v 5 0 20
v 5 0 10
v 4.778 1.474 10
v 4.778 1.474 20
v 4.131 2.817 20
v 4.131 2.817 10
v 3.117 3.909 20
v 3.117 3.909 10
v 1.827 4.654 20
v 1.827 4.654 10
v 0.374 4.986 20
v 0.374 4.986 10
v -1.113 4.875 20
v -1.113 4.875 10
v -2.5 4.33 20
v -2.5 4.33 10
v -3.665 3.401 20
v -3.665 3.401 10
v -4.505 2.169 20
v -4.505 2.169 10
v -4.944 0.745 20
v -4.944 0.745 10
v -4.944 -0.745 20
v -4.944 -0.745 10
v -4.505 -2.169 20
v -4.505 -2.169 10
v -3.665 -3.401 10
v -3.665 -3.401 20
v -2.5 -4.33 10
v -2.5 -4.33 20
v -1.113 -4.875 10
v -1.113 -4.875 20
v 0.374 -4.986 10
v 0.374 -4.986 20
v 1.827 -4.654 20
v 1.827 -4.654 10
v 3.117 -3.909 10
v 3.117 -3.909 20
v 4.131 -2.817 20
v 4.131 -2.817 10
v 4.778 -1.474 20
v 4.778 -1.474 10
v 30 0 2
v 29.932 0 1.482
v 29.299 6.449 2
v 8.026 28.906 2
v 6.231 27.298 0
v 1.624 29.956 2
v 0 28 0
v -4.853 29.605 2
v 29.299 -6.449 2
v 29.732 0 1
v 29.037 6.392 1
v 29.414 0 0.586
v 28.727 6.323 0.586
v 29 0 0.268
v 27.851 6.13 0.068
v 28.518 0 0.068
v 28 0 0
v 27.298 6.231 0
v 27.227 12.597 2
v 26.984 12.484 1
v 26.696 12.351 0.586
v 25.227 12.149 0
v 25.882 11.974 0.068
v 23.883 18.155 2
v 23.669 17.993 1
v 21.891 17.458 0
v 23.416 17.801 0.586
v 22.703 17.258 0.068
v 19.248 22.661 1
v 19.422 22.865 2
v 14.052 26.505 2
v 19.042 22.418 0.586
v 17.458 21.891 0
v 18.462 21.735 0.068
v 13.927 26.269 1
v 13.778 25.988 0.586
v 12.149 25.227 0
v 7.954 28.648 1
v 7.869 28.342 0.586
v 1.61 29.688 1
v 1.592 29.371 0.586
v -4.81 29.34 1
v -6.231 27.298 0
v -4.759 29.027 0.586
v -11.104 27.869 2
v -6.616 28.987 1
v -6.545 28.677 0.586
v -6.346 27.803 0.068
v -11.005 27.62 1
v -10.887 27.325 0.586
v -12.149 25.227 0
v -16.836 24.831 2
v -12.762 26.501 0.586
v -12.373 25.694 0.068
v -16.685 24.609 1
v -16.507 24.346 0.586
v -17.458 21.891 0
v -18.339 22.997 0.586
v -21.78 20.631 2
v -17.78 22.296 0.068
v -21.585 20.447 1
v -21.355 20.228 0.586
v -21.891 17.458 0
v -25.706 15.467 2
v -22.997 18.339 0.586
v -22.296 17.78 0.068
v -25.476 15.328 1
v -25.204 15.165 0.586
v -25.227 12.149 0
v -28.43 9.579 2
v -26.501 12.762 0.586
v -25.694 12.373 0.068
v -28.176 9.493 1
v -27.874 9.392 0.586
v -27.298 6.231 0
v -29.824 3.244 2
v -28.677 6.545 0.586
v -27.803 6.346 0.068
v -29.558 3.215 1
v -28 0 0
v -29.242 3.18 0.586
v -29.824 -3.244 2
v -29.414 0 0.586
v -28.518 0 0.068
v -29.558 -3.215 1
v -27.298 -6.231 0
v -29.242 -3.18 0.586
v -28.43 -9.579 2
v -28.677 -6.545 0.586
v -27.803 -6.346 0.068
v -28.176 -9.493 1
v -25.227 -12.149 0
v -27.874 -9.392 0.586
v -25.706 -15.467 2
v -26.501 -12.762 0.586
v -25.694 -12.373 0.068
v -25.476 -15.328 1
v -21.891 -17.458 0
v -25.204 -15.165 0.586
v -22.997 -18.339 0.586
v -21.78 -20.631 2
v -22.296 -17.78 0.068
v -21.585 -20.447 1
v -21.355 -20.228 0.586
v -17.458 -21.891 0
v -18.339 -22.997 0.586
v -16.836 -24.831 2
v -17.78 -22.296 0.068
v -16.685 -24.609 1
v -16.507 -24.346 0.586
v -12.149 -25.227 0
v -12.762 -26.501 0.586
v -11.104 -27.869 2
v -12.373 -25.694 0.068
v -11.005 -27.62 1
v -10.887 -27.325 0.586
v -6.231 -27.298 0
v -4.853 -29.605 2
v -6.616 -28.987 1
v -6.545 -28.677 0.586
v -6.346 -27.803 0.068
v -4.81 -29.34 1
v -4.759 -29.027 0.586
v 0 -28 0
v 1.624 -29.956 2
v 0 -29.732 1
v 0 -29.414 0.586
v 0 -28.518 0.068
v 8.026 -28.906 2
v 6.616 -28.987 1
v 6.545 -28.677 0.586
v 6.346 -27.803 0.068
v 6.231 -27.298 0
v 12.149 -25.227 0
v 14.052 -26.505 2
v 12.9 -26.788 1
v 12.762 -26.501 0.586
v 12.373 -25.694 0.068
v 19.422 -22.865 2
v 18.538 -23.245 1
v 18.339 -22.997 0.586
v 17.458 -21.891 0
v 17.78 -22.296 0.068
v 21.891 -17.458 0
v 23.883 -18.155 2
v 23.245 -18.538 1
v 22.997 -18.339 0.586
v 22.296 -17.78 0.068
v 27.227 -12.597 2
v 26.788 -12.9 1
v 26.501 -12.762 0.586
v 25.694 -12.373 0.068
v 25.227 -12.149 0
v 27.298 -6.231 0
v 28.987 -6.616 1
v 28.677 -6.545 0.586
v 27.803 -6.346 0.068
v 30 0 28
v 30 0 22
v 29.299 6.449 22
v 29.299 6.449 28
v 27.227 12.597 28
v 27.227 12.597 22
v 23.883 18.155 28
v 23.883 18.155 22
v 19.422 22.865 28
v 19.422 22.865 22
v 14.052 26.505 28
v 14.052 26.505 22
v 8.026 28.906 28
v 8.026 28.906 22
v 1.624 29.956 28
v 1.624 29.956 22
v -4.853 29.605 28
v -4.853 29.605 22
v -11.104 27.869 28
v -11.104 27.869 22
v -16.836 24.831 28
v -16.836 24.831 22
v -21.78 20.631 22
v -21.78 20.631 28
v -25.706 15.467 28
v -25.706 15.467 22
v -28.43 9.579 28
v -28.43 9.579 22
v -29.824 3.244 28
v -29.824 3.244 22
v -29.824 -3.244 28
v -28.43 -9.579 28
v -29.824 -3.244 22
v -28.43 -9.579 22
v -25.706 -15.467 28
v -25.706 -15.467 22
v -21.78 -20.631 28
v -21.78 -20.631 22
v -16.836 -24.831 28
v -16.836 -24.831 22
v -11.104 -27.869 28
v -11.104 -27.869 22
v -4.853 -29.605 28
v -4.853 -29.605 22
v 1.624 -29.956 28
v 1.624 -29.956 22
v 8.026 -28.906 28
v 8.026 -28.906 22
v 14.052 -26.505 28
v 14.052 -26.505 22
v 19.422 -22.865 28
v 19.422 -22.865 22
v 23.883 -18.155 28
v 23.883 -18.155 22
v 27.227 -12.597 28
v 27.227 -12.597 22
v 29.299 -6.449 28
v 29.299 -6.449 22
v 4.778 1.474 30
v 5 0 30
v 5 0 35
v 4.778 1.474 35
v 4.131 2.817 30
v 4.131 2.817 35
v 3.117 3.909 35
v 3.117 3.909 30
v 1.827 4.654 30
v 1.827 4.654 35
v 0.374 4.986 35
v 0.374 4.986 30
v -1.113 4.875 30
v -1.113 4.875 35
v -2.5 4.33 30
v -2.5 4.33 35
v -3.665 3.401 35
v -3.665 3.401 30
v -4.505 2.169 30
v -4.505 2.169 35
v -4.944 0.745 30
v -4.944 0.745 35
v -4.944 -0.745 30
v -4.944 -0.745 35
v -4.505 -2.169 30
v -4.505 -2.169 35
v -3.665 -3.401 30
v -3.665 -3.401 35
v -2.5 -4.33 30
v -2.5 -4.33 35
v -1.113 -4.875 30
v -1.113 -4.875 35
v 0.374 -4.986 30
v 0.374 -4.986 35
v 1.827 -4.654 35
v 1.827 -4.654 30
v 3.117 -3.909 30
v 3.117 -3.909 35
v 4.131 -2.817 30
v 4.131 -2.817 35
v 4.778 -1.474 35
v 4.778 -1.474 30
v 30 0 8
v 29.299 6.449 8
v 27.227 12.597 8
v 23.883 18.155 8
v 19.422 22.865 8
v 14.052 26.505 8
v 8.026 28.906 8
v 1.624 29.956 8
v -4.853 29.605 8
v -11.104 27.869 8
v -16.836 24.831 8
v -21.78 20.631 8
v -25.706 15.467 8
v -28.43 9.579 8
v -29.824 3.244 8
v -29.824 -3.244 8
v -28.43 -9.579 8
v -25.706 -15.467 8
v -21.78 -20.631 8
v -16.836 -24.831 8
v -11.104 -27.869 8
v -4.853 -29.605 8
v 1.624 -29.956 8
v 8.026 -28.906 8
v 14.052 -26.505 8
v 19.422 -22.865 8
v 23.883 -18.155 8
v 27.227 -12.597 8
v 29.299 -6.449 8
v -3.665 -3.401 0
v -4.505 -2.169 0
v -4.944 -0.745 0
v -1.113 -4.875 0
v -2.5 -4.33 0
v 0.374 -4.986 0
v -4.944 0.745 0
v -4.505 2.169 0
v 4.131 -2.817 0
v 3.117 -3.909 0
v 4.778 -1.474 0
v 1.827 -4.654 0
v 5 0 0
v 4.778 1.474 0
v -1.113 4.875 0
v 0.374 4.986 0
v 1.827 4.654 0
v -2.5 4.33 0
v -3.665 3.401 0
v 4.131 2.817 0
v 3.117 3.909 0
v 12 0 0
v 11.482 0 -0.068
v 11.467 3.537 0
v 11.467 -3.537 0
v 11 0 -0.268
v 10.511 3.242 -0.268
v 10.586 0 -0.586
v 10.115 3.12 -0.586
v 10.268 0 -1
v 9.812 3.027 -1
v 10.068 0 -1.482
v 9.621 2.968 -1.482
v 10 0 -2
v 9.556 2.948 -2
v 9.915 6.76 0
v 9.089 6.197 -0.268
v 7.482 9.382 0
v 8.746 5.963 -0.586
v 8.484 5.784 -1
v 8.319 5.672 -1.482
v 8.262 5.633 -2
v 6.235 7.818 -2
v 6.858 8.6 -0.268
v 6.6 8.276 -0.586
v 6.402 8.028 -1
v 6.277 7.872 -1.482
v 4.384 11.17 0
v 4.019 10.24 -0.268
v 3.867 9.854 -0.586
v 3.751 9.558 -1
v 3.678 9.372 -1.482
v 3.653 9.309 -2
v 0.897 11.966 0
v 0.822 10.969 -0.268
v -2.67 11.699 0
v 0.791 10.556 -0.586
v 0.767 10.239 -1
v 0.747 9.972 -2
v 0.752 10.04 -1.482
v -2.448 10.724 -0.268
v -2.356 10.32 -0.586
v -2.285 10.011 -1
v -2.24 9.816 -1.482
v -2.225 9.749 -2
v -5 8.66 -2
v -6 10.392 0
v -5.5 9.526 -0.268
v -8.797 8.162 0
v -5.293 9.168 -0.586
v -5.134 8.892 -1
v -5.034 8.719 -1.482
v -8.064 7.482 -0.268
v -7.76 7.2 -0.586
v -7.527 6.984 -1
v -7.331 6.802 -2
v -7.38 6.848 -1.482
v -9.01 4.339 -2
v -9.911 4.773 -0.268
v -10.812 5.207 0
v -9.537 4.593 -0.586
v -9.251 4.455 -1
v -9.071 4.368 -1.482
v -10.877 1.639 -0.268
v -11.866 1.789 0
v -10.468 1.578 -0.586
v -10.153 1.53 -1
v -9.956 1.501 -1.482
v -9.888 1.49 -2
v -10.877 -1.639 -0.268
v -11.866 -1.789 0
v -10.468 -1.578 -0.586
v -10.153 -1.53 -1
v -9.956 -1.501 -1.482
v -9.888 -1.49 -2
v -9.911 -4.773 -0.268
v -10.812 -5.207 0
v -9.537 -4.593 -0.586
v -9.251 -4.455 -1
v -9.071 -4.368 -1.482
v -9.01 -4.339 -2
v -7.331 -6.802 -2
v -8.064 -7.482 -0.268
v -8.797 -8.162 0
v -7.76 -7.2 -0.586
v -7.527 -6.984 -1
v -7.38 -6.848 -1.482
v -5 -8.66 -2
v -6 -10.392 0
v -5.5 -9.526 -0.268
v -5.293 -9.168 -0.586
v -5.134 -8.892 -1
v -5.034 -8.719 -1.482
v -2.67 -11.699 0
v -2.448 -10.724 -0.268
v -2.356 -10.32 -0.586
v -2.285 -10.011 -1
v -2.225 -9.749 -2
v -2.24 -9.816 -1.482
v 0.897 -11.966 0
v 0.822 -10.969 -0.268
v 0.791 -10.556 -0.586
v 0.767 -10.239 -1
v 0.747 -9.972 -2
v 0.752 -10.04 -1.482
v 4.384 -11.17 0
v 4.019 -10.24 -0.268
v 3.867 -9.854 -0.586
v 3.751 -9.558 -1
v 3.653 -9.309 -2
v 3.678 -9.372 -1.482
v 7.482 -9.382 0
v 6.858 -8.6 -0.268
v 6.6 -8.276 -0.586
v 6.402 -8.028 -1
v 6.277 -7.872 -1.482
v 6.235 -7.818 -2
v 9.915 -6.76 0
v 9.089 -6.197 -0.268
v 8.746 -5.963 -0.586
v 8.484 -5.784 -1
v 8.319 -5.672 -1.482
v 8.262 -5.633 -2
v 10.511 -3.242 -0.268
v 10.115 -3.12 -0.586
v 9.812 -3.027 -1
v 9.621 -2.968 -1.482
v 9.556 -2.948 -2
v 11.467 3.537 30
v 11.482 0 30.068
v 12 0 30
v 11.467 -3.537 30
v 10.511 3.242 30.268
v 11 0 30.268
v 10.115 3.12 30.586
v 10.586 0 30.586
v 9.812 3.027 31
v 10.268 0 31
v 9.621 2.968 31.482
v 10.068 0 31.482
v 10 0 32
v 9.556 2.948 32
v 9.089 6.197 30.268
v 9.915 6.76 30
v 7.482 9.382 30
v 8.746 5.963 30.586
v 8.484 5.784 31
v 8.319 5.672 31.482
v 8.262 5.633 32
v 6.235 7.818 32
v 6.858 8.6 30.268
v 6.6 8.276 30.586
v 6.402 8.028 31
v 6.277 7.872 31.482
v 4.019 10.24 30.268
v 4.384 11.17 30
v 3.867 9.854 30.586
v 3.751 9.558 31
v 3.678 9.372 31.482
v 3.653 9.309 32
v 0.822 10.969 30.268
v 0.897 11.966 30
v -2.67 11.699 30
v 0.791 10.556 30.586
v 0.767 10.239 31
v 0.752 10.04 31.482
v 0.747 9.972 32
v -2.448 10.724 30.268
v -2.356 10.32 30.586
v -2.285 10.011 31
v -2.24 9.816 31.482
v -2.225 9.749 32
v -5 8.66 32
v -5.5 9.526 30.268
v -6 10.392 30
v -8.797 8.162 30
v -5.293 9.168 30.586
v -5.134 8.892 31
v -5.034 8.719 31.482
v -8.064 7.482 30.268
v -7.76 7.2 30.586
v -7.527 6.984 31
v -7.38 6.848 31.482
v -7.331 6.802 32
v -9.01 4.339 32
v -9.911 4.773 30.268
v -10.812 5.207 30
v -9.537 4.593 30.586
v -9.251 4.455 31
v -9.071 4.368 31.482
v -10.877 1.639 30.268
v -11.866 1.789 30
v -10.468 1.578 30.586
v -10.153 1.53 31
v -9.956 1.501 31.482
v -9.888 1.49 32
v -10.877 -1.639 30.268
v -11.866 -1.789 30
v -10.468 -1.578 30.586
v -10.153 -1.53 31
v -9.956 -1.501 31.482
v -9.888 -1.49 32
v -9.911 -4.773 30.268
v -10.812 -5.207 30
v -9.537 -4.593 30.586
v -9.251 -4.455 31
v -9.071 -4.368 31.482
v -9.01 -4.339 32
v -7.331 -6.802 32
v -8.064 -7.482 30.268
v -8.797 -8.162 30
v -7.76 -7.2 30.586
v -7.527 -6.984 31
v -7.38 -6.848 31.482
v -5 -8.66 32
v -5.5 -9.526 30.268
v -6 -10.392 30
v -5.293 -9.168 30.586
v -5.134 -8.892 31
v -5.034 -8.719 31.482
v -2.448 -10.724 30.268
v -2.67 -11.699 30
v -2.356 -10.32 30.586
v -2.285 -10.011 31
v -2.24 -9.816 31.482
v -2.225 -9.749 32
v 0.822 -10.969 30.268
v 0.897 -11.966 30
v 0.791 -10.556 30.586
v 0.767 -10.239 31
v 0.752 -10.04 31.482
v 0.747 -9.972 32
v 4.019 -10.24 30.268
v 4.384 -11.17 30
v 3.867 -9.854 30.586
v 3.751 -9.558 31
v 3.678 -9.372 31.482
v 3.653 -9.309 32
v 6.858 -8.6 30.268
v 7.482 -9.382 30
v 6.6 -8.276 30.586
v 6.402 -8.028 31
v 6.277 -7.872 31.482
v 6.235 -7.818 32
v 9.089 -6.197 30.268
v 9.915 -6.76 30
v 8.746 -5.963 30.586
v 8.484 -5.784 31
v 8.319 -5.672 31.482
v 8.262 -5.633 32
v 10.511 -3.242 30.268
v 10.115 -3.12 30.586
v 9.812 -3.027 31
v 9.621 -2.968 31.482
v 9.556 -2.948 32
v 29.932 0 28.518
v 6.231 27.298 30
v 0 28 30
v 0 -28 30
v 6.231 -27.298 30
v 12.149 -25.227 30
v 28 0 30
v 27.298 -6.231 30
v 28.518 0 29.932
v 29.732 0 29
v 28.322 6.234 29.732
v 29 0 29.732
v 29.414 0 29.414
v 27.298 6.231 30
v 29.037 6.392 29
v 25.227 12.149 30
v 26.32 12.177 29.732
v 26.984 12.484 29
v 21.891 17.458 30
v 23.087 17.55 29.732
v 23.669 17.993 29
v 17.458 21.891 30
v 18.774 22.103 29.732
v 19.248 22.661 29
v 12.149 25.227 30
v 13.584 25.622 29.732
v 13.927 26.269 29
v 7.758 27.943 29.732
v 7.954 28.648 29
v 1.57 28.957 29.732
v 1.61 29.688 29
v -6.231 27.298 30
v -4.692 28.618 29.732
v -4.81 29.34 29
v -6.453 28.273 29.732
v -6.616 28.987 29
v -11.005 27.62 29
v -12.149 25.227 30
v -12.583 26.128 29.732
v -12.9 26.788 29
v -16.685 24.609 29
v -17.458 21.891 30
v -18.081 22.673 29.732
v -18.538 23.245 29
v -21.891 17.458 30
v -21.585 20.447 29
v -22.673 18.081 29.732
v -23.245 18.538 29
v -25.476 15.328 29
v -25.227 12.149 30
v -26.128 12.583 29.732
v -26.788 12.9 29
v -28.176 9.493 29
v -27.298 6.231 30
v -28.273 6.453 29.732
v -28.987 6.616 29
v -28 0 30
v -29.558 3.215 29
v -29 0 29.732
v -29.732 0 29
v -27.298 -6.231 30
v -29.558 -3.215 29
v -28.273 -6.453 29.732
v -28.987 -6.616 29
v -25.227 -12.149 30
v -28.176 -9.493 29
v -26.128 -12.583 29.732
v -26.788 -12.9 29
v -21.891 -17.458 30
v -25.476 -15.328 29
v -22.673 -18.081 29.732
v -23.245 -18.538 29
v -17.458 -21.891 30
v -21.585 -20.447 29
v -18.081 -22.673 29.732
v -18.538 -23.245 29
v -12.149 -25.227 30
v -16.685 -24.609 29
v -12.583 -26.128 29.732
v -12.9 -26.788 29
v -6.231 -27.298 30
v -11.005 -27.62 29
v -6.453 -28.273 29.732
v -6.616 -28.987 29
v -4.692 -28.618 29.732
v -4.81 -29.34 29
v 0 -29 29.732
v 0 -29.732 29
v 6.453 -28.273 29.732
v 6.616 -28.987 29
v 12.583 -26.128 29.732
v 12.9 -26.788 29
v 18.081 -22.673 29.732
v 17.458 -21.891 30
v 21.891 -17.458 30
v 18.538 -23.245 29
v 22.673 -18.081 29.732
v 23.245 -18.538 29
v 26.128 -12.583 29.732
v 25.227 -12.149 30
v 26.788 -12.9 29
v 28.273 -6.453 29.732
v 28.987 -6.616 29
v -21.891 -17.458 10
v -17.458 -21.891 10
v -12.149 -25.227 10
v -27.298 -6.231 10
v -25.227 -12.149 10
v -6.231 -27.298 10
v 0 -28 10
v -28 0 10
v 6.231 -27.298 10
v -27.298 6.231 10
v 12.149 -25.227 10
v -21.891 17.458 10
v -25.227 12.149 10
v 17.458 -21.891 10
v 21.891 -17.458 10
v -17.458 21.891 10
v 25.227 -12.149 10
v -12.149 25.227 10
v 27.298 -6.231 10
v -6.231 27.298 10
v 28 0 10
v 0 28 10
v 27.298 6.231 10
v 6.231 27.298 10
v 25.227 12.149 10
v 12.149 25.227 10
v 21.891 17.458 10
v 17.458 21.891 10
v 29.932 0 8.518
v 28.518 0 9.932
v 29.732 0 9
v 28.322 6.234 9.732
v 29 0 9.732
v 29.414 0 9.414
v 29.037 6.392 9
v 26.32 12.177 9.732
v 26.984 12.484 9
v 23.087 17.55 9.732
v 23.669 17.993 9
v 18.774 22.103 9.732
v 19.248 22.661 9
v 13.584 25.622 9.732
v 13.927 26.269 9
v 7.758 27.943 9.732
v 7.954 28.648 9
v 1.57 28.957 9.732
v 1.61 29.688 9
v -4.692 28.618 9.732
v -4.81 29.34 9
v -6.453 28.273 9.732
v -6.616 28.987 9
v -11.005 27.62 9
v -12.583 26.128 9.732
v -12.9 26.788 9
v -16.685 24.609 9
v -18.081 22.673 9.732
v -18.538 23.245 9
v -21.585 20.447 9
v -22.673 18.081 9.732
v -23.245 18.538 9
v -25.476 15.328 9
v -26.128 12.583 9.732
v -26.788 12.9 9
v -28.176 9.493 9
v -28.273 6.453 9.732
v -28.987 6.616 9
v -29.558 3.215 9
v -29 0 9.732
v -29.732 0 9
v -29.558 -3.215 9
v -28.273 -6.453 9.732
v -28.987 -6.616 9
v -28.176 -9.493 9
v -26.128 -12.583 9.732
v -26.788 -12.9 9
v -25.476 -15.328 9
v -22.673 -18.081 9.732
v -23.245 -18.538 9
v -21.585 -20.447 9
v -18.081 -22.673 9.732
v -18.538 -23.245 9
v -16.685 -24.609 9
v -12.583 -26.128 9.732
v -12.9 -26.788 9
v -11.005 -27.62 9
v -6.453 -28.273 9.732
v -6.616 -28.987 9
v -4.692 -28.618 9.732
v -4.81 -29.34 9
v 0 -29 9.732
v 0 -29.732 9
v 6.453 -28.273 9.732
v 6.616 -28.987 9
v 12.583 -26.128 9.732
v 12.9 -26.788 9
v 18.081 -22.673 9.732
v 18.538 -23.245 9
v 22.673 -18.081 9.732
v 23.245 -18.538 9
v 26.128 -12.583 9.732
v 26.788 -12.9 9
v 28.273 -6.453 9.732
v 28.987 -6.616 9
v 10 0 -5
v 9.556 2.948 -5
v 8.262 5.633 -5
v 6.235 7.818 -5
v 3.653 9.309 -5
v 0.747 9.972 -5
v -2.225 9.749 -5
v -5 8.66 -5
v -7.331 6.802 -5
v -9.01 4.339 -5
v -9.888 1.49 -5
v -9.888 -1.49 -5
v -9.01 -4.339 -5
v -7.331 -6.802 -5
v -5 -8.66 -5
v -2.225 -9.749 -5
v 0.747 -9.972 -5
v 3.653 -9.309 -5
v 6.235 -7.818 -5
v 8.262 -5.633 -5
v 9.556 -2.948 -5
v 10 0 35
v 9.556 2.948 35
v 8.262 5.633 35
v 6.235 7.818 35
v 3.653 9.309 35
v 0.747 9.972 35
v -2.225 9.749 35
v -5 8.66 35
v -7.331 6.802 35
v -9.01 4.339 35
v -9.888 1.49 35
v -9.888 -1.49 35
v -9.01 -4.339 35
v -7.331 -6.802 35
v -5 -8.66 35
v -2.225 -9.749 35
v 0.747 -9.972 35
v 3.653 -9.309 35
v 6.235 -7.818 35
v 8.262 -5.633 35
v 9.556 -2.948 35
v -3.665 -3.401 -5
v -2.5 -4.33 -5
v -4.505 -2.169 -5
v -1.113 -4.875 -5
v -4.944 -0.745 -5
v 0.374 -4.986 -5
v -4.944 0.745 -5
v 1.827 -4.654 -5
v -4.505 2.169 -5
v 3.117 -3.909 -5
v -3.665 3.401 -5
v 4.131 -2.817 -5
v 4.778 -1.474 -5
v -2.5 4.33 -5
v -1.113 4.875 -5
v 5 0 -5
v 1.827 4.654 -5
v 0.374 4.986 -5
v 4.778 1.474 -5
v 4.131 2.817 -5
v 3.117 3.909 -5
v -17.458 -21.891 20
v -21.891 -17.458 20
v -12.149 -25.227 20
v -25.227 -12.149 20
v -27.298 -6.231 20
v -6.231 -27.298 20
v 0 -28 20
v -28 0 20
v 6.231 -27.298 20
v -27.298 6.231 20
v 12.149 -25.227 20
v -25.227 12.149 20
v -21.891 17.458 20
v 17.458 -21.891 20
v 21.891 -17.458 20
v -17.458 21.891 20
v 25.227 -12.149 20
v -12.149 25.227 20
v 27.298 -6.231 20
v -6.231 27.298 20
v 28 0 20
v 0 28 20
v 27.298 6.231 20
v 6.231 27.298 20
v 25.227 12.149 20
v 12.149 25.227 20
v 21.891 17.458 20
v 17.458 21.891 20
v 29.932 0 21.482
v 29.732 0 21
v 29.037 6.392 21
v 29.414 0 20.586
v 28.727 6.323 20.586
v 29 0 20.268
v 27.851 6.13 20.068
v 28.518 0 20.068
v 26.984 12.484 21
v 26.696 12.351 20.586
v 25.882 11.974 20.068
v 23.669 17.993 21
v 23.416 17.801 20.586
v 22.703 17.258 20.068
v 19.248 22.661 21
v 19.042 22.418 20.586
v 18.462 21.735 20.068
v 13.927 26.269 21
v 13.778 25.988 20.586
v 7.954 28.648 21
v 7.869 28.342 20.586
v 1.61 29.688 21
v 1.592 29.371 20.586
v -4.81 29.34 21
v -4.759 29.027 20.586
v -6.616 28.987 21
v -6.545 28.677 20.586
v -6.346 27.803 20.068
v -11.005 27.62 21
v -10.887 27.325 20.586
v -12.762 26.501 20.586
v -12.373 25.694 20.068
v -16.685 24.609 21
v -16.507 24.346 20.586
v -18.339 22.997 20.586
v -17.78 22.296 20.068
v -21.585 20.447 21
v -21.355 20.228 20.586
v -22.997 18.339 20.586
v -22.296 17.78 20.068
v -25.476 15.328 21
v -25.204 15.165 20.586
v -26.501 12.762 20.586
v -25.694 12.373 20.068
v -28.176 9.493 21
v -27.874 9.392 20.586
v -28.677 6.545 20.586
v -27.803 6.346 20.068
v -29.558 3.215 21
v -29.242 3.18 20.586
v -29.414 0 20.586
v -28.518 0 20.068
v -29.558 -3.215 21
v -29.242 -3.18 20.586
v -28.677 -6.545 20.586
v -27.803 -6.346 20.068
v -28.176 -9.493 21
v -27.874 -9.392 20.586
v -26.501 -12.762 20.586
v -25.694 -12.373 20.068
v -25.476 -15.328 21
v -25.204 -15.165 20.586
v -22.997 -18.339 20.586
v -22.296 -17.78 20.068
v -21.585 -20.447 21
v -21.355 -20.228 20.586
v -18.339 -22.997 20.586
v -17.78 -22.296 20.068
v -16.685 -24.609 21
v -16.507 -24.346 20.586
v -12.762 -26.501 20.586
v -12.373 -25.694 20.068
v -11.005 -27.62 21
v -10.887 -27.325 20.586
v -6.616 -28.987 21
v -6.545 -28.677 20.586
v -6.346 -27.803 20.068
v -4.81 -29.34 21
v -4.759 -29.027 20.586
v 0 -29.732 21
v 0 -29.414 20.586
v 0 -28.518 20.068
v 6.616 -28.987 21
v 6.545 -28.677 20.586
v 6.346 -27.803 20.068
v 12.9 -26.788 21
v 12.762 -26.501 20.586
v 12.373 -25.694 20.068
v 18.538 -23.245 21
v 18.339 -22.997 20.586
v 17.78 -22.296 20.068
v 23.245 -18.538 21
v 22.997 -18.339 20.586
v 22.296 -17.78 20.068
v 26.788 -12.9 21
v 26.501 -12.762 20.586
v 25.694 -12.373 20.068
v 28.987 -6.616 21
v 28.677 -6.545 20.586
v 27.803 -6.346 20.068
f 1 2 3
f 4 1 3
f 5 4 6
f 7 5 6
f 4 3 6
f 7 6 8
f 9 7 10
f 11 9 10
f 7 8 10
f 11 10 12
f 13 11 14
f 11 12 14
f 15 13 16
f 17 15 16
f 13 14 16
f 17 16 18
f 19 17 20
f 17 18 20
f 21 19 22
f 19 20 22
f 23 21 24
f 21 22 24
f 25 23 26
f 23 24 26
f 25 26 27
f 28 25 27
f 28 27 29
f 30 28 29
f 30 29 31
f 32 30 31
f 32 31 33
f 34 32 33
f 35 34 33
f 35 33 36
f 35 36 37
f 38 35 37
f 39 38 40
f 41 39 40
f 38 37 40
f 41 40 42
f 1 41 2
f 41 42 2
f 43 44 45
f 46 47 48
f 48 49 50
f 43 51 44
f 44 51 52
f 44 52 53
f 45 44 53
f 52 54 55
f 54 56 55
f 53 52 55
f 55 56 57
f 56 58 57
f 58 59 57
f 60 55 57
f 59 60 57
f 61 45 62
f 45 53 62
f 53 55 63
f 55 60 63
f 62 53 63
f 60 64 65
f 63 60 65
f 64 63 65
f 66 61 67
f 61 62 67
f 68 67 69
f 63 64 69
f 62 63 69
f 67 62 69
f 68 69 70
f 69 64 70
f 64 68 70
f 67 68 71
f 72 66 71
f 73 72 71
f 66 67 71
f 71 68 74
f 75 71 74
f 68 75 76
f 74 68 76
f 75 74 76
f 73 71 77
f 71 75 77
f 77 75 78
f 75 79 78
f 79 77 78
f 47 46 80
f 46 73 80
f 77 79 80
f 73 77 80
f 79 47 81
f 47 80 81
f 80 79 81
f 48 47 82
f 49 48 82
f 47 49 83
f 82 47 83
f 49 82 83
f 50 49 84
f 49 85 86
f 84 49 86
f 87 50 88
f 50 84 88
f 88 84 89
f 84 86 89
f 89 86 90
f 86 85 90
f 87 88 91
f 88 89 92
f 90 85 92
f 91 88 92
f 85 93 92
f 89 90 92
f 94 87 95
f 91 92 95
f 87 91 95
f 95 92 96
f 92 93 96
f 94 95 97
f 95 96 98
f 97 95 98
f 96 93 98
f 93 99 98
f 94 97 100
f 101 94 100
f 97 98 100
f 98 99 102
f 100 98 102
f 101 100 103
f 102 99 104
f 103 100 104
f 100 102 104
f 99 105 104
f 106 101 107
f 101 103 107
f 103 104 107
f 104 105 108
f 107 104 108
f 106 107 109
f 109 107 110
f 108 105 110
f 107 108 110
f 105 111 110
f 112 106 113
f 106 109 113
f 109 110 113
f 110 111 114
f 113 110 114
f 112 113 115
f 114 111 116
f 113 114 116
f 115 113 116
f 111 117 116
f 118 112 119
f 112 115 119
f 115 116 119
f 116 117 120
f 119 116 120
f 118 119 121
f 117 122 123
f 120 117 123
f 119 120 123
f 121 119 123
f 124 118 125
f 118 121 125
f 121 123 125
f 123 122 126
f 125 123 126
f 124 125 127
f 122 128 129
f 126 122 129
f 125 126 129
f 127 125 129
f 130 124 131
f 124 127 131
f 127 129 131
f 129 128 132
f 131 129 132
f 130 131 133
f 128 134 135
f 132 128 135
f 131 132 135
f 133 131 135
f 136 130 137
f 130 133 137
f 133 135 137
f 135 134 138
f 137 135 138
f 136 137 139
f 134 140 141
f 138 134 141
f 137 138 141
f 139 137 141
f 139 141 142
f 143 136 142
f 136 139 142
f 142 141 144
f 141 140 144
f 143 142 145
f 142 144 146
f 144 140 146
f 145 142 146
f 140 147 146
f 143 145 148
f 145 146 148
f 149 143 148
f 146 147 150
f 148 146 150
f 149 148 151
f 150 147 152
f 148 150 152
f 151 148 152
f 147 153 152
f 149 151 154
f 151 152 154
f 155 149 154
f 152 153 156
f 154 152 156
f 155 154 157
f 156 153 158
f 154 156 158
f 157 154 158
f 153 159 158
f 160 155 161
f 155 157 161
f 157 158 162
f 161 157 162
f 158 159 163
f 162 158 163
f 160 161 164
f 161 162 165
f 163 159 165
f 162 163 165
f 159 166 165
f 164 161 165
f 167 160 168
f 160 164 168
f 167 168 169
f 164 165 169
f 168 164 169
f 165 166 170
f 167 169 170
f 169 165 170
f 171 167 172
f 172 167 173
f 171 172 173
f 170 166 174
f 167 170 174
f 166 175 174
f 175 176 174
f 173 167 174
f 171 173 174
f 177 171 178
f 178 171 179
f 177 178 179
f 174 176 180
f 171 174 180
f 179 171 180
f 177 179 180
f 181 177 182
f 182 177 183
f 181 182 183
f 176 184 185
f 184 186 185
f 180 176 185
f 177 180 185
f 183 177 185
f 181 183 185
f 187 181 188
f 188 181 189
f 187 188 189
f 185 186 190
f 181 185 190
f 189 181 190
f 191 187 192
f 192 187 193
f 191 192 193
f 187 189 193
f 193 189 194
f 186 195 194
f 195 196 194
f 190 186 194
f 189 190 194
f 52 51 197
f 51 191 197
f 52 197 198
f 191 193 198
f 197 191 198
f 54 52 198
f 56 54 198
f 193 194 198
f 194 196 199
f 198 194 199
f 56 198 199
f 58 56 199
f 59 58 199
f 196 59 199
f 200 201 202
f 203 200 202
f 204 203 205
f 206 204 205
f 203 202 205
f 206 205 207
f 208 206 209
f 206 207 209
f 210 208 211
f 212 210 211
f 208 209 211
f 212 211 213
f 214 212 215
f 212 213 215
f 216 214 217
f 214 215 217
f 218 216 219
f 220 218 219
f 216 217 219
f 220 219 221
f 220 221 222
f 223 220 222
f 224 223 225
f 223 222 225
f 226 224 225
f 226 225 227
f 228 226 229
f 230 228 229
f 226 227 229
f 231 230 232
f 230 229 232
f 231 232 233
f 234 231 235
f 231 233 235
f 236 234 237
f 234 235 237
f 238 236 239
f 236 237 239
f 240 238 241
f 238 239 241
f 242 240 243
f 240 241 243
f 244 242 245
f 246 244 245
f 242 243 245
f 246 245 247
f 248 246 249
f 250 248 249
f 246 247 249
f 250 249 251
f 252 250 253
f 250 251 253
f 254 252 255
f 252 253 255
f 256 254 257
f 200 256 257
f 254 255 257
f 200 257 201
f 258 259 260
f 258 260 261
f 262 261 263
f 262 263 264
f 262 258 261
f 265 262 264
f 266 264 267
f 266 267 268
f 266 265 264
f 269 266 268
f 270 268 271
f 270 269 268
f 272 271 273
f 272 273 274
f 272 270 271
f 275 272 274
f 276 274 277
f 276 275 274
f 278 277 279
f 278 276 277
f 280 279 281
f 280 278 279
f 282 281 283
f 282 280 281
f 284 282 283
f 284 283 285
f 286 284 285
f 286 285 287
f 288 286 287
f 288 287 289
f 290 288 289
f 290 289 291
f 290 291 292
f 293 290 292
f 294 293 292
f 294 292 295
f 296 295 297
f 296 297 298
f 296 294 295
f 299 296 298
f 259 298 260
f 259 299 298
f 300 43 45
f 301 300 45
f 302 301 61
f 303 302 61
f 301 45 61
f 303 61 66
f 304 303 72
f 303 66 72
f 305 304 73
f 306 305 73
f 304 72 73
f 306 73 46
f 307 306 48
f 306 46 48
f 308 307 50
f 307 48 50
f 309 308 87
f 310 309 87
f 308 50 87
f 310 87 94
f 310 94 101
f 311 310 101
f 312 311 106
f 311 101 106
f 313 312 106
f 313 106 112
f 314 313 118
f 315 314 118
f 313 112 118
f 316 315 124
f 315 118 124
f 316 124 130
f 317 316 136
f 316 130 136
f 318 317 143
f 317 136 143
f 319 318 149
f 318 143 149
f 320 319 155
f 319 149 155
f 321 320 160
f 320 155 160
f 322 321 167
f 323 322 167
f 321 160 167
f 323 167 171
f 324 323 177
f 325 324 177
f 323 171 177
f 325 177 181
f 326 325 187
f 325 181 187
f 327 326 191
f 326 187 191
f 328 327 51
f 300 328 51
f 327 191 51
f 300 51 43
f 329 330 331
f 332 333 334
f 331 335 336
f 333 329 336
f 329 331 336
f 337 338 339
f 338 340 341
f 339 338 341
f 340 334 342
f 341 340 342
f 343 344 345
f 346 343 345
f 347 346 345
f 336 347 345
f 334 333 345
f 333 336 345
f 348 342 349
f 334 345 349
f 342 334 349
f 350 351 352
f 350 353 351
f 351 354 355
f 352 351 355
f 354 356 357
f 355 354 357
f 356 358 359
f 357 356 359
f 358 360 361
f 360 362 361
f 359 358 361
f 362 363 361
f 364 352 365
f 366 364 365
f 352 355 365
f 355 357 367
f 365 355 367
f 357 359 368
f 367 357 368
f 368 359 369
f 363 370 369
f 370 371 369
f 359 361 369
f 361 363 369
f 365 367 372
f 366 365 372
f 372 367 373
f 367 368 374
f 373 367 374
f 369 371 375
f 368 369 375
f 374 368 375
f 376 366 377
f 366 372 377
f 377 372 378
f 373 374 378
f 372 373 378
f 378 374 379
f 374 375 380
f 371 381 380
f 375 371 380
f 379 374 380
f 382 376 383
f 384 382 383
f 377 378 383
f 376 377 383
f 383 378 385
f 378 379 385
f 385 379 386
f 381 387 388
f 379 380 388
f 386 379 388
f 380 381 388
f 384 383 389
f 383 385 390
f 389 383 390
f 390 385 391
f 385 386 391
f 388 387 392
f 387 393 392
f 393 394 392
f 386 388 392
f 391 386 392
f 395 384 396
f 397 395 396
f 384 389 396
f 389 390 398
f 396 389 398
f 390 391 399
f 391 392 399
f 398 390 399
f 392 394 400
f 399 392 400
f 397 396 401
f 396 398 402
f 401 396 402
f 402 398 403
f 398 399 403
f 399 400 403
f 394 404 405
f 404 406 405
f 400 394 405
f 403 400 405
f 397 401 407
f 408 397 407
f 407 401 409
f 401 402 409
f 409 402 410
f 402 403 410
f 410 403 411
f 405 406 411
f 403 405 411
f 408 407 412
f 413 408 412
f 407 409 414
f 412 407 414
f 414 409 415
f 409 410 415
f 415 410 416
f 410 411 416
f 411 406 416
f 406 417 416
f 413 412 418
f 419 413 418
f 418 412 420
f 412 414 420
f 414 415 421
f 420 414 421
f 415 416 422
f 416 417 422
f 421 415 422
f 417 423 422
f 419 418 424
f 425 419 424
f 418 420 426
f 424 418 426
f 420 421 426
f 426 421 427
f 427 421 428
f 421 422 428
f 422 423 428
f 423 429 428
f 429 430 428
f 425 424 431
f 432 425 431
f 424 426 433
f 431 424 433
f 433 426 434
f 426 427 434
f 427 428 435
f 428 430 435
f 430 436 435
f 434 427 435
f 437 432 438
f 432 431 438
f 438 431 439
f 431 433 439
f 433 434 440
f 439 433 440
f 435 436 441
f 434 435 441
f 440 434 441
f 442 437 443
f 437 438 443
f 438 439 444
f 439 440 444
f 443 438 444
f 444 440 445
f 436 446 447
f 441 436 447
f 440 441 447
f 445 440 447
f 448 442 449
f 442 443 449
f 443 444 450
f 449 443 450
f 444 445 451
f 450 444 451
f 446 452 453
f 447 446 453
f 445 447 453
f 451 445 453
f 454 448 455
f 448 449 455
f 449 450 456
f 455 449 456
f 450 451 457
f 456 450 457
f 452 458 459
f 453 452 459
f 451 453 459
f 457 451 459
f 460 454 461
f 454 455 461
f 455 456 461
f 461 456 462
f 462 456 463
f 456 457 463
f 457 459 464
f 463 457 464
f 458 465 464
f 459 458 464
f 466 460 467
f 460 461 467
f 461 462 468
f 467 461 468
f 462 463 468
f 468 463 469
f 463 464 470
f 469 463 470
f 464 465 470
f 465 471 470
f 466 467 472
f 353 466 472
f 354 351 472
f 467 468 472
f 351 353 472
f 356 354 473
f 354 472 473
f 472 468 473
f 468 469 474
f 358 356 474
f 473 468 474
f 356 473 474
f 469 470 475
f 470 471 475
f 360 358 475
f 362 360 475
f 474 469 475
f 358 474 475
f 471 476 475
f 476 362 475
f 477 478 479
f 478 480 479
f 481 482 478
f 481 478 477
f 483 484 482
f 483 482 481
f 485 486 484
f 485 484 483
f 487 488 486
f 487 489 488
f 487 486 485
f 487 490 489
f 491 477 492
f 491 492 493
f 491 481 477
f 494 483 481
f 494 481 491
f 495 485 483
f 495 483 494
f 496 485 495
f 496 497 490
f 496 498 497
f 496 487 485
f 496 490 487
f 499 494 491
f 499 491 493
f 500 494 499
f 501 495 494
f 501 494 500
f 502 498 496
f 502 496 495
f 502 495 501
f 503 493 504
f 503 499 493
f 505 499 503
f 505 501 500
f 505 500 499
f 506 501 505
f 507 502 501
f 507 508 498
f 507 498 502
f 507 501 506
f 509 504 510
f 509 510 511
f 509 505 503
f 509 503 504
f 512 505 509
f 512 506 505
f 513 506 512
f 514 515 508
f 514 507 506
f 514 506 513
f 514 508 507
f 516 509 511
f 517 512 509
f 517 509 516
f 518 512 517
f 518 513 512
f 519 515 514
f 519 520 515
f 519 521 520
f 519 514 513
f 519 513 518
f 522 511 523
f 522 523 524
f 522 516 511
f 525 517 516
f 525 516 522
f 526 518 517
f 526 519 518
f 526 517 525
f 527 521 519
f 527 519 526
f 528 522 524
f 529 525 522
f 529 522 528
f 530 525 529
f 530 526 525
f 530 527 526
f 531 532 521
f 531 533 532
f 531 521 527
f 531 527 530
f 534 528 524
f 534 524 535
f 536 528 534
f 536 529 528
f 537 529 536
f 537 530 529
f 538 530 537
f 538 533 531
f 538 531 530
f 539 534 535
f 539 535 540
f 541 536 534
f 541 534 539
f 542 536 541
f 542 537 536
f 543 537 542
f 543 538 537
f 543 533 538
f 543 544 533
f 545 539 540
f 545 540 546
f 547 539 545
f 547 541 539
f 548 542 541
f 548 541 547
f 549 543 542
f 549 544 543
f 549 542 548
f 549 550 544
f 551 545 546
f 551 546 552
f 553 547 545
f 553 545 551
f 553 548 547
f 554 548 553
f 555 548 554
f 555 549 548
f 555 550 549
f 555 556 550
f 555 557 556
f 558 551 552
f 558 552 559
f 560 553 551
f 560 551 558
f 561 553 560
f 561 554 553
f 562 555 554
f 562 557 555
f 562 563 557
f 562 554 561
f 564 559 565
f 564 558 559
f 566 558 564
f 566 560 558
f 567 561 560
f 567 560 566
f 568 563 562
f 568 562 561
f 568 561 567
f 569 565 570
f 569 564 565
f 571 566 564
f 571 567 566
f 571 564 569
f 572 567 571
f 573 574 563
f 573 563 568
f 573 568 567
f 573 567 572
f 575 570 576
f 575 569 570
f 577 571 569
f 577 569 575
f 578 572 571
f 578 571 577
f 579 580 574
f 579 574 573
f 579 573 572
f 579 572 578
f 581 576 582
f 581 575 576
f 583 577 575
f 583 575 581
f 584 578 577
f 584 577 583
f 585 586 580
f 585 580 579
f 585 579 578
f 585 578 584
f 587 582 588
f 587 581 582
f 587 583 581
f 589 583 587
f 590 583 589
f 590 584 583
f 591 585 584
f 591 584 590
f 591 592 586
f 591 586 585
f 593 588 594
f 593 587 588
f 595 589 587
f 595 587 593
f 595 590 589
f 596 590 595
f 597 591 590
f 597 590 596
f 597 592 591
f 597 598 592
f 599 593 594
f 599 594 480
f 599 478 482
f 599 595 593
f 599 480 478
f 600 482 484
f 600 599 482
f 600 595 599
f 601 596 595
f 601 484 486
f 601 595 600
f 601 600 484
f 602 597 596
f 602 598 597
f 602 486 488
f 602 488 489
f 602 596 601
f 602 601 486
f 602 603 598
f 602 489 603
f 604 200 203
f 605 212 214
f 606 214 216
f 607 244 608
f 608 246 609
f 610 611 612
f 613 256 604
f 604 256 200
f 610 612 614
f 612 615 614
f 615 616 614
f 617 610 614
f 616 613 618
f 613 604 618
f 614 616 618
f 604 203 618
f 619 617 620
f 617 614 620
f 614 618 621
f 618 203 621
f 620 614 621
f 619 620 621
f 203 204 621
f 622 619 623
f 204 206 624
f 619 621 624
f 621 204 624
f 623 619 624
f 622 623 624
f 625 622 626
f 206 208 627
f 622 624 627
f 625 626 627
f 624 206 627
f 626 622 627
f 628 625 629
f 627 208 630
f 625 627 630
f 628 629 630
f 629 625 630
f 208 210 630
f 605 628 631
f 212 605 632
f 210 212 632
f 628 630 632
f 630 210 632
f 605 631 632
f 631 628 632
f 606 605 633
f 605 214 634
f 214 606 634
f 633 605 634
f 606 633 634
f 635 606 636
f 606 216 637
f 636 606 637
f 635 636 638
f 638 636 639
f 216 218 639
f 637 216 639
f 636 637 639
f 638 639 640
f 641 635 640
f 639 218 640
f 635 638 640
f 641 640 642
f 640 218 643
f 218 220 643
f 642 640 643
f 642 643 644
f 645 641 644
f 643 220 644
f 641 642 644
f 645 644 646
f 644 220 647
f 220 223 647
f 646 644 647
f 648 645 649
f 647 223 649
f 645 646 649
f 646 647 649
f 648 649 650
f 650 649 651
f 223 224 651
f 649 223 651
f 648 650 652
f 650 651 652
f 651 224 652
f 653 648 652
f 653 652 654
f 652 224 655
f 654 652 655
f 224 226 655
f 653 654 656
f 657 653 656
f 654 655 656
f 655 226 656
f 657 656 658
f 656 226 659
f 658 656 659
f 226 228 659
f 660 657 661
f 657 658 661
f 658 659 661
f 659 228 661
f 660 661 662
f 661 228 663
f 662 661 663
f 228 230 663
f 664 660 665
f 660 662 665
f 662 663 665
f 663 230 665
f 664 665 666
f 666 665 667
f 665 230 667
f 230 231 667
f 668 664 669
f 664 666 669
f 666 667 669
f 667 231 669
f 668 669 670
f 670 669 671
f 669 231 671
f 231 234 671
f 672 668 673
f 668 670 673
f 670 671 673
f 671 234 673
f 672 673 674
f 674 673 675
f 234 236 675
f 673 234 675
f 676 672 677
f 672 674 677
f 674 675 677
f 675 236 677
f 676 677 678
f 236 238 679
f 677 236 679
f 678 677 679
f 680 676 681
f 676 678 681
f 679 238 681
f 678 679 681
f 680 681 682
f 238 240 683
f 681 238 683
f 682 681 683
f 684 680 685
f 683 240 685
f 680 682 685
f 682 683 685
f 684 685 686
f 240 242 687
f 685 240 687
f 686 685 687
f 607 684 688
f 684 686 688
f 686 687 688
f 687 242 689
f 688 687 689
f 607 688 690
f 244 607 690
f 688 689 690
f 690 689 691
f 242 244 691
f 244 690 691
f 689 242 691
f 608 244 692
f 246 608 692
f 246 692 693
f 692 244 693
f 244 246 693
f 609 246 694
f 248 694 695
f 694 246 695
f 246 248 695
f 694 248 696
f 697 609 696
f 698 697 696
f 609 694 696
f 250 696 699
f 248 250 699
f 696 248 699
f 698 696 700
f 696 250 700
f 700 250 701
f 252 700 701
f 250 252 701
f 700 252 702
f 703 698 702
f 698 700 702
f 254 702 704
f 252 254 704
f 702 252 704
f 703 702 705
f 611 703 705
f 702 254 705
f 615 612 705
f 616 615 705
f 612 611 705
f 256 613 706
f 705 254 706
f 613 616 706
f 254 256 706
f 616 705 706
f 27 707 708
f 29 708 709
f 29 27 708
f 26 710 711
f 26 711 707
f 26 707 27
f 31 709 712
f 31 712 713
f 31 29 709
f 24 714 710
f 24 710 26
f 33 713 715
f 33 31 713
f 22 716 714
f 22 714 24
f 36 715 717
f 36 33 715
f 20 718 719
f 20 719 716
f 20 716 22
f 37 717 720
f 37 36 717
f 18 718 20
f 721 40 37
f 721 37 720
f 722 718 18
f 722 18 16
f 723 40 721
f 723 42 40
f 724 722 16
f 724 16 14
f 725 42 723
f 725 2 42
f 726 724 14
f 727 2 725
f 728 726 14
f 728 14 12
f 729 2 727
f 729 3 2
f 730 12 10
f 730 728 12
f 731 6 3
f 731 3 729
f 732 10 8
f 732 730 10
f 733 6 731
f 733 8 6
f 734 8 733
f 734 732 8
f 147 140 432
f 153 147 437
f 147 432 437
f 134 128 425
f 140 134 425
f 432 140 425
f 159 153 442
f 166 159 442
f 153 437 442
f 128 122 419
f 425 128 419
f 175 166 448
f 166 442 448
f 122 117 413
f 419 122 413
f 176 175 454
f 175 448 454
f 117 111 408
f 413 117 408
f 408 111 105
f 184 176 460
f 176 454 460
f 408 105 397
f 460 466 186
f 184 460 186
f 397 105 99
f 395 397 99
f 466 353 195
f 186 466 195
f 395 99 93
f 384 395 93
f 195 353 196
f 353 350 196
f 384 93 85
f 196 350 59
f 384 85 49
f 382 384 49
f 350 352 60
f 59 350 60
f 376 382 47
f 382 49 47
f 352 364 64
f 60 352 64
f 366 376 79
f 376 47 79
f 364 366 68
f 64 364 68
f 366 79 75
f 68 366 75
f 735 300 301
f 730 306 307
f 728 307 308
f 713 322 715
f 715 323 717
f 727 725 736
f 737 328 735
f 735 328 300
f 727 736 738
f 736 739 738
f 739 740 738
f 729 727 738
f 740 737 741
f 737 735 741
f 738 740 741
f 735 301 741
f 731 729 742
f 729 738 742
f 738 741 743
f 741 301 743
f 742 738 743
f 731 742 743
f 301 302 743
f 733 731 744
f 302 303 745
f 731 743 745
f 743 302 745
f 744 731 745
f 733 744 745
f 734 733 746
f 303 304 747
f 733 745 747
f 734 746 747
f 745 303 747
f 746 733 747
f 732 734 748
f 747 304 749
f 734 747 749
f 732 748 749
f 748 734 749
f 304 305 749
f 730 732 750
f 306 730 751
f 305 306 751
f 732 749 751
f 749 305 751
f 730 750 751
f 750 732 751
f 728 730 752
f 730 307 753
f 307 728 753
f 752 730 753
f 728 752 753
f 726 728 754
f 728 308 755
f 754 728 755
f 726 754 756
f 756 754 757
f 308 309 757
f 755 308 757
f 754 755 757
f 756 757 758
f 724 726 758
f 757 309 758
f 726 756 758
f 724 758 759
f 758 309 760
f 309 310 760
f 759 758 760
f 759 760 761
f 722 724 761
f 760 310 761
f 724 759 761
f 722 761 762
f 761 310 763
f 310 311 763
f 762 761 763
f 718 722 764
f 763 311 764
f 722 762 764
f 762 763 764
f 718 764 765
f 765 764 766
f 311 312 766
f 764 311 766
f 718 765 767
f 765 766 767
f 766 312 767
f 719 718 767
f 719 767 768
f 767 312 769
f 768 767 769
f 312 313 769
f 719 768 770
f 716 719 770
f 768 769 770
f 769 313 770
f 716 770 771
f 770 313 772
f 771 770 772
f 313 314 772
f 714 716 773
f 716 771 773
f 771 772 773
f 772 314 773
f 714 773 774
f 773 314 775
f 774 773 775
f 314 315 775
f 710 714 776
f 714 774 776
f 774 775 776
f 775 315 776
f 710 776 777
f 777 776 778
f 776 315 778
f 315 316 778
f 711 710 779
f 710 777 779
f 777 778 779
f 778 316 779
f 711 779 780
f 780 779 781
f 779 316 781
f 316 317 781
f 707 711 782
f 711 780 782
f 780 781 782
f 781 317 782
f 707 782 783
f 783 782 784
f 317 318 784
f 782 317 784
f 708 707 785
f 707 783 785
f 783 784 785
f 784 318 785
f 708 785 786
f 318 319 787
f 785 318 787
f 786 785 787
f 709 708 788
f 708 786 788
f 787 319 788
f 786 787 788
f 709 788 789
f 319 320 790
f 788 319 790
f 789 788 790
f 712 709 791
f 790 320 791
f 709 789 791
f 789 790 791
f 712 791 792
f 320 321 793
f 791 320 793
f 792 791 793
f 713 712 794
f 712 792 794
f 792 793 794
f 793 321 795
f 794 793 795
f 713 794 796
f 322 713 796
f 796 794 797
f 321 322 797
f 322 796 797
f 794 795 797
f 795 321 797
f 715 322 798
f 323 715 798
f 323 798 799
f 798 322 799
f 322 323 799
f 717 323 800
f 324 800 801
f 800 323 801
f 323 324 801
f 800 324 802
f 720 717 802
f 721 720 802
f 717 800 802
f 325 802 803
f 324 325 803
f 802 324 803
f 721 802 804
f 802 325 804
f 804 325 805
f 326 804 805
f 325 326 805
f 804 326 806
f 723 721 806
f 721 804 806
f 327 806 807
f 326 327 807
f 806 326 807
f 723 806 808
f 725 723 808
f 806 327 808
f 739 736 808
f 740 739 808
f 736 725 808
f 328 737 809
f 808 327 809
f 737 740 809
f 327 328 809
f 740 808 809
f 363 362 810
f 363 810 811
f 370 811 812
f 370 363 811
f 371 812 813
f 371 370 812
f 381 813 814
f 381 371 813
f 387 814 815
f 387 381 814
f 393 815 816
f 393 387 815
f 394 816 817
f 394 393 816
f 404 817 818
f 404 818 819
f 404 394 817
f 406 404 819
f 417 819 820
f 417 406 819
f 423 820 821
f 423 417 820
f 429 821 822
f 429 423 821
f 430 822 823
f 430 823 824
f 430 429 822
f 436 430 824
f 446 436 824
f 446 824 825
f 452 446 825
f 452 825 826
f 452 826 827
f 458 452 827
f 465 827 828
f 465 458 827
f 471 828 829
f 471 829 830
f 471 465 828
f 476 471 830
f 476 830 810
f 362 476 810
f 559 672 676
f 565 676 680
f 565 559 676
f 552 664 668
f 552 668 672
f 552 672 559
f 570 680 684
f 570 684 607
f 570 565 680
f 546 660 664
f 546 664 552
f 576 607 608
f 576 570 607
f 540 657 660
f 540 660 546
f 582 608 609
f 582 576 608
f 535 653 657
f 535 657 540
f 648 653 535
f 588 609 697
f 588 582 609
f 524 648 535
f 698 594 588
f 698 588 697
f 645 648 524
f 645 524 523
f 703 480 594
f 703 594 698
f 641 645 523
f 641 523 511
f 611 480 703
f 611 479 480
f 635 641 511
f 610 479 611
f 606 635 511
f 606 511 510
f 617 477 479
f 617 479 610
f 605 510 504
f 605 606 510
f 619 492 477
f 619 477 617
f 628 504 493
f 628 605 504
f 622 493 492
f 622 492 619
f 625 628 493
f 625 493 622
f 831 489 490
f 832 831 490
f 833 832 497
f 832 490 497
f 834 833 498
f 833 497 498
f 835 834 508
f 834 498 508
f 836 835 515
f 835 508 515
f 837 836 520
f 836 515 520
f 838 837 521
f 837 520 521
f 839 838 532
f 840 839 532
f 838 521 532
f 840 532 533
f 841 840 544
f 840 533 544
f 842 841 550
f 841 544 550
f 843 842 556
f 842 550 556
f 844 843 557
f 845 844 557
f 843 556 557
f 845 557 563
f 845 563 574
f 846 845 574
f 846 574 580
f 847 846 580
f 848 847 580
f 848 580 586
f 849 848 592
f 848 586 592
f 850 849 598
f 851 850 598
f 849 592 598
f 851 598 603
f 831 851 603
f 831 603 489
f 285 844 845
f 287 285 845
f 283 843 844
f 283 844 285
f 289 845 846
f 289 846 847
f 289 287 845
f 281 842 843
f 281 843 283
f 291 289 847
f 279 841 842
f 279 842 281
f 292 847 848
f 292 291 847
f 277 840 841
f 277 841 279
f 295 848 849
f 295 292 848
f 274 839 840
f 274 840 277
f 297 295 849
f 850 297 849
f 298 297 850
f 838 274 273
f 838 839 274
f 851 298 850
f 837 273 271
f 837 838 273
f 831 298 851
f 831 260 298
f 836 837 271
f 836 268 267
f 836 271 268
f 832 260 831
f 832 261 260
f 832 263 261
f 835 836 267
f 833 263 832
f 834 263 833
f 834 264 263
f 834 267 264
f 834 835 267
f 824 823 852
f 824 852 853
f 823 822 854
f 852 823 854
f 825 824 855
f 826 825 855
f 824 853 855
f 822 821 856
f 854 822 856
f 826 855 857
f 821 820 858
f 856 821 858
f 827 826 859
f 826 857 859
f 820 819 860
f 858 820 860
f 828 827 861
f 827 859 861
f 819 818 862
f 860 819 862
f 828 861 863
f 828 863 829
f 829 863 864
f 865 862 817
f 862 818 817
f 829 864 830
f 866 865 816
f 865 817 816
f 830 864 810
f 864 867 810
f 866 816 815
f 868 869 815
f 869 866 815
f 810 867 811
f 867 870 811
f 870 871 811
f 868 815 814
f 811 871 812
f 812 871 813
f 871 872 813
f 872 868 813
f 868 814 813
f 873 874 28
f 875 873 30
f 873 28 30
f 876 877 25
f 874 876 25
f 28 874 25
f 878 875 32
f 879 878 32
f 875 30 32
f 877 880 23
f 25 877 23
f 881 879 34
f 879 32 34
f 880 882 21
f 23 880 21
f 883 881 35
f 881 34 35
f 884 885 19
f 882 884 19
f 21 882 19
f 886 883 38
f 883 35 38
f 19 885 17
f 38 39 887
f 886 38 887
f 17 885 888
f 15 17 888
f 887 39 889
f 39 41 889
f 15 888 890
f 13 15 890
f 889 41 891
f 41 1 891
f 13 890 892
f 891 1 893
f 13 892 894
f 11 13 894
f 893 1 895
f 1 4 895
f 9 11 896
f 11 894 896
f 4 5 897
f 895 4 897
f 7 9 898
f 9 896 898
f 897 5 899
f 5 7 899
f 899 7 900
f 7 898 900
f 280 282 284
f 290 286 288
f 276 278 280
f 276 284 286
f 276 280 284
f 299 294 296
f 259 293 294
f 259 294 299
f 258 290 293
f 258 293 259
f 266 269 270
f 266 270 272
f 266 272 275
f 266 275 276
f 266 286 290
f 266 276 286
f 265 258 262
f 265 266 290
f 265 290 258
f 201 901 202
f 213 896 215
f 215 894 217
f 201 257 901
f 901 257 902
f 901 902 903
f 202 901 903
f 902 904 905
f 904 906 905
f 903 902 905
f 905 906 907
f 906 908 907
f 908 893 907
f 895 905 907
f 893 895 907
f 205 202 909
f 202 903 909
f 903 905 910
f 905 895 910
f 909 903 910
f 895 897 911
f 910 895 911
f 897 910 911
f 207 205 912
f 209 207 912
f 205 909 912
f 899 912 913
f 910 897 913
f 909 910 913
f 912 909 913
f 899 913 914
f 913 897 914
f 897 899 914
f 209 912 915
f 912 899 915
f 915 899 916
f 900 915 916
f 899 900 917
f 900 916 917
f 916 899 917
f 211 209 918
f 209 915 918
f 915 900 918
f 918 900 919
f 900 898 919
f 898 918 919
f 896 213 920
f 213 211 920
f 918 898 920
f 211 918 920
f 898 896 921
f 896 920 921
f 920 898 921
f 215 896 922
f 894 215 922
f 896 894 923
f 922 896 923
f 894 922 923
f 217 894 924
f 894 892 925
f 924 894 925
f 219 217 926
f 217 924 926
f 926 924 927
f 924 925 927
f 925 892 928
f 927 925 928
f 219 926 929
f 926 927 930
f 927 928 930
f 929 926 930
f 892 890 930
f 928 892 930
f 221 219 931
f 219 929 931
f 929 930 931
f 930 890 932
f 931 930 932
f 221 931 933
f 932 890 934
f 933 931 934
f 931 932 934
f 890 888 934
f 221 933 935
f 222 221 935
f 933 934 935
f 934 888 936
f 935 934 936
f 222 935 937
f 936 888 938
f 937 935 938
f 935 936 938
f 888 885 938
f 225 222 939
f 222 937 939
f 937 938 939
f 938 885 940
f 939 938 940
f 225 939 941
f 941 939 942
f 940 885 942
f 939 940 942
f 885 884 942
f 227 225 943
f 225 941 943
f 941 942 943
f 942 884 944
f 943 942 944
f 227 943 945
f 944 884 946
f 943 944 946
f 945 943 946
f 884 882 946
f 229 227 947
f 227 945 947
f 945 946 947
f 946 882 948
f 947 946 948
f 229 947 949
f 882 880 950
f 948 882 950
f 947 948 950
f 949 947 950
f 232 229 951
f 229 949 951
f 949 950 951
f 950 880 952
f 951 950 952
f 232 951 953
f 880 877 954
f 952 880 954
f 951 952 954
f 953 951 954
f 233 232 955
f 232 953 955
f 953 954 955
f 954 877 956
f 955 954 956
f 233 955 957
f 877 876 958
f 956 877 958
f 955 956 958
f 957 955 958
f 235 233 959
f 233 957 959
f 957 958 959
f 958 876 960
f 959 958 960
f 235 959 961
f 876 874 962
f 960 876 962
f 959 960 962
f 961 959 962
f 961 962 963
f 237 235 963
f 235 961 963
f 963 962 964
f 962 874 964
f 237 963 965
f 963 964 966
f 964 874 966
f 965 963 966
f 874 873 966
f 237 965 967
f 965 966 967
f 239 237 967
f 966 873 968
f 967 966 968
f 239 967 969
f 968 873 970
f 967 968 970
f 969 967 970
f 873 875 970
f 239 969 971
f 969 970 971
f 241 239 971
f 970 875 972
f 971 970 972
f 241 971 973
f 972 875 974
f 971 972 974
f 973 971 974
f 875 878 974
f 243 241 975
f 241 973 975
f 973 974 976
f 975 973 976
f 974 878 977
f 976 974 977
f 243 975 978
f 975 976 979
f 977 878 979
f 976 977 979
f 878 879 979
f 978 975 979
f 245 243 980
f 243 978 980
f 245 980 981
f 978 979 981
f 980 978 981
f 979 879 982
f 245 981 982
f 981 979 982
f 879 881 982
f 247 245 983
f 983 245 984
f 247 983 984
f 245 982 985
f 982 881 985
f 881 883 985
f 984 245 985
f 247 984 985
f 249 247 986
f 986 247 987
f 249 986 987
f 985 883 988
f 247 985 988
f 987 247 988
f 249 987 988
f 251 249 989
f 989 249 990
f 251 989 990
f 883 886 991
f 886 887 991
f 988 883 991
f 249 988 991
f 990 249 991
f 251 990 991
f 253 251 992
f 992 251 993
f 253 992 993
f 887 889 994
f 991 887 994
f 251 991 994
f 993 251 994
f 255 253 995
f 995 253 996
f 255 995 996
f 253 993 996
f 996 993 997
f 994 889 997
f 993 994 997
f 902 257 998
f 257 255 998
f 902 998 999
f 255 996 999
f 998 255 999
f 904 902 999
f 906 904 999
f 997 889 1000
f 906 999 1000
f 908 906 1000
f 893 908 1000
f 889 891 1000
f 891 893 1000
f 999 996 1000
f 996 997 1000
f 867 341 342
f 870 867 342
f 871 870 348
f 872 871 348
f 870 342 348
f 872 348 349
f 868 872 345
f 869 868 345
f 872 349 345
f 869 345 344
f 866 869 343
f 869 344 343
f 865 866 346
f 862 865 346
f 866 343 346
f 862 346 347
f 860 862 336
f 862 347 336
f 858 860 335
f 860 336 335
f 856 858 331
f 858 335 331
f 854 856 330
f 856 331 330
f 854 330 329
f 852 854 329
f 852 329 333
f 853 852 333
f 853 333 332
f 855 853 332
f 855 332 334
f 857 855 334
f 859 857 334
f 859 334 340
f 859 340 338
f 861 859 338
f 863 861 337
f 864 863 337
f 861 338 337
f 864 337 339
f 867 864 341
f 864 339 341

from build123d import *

# Parameters (mm, degrees)
SKETCH1_R           = 30
BOSS_EXTRUDE1_DEPTH = 10
SKETCH2_R           = 5
BOSS_EXTRUDE2_DEPTH = 10
SKETCH3_R           = 30
BOSS_EXTRUDE3_DEPTH = 10
SKETCH5_R           = 10
SKETCH5_R_2         = 5
BOSS_EXTRUDE5_DEPTH = 5
FILLET1_R           = 2
FILLET2_R           = 2


with BuildPart() as part:
    # Sketch1 → Boss-Extrude1 (new body)
    with BuildSketch(Plane.XY):
        Circle(SKETCH1_R)
    extrude(amount=BOSS_EXTRUDE1_DEPTH)

    # Sketch2 → Boss-Extrude2 (add)
    with BuildSketch(Plane.XY.offset(10)):
        Circle(SKETCH2_R)
    extrude(amount=BOSS_EXTRUDE2_DEPTH)

    # Sketch3 → Boss-Extrude3 (add)
    with BuildSketch(Plane.XY.offset(20)):
        Circle(SKETCH3_R)
    extrude(amount=BOSS_EXTRUDE3_DEPTH)

    # Sketch5 → Boss-Extrude5 (add)
    with BuildSketch(Plane.XY.offset(30)):
        Circle(SKETCH5_R)
        Circle(SKETCH5_R_2, mode=Mode.SUBTRACT)
    boss_extrude5 = extrude(amount=BOSS_EXTRUDE5_DEPTH)

    # Mirror1: Boss-Extrude5 across plane
    add(boss_extrude5.mirror(Plane.XY.offset(15)))

    # Fillet1
    fillet1_edges = [part.edges().sort_by_distance(p)[0] for p in [
        (-10, 0, 30),
        (-10, 0, 0),
    ]]
    fillet(fillet1_edges, radius=FILLET1_R)

    # Fillet2
    fillet2_edges = [part.edges().sort_by_distance(p)[0] for p in [
        (-30, 0, 30),
        (-30, 0, 0),
        (-30, 0, 10),
        (-30, 0, 20),
    ]]
    fillet(fillet2_edges, radius=FILLET2_R)


solid = part.part
